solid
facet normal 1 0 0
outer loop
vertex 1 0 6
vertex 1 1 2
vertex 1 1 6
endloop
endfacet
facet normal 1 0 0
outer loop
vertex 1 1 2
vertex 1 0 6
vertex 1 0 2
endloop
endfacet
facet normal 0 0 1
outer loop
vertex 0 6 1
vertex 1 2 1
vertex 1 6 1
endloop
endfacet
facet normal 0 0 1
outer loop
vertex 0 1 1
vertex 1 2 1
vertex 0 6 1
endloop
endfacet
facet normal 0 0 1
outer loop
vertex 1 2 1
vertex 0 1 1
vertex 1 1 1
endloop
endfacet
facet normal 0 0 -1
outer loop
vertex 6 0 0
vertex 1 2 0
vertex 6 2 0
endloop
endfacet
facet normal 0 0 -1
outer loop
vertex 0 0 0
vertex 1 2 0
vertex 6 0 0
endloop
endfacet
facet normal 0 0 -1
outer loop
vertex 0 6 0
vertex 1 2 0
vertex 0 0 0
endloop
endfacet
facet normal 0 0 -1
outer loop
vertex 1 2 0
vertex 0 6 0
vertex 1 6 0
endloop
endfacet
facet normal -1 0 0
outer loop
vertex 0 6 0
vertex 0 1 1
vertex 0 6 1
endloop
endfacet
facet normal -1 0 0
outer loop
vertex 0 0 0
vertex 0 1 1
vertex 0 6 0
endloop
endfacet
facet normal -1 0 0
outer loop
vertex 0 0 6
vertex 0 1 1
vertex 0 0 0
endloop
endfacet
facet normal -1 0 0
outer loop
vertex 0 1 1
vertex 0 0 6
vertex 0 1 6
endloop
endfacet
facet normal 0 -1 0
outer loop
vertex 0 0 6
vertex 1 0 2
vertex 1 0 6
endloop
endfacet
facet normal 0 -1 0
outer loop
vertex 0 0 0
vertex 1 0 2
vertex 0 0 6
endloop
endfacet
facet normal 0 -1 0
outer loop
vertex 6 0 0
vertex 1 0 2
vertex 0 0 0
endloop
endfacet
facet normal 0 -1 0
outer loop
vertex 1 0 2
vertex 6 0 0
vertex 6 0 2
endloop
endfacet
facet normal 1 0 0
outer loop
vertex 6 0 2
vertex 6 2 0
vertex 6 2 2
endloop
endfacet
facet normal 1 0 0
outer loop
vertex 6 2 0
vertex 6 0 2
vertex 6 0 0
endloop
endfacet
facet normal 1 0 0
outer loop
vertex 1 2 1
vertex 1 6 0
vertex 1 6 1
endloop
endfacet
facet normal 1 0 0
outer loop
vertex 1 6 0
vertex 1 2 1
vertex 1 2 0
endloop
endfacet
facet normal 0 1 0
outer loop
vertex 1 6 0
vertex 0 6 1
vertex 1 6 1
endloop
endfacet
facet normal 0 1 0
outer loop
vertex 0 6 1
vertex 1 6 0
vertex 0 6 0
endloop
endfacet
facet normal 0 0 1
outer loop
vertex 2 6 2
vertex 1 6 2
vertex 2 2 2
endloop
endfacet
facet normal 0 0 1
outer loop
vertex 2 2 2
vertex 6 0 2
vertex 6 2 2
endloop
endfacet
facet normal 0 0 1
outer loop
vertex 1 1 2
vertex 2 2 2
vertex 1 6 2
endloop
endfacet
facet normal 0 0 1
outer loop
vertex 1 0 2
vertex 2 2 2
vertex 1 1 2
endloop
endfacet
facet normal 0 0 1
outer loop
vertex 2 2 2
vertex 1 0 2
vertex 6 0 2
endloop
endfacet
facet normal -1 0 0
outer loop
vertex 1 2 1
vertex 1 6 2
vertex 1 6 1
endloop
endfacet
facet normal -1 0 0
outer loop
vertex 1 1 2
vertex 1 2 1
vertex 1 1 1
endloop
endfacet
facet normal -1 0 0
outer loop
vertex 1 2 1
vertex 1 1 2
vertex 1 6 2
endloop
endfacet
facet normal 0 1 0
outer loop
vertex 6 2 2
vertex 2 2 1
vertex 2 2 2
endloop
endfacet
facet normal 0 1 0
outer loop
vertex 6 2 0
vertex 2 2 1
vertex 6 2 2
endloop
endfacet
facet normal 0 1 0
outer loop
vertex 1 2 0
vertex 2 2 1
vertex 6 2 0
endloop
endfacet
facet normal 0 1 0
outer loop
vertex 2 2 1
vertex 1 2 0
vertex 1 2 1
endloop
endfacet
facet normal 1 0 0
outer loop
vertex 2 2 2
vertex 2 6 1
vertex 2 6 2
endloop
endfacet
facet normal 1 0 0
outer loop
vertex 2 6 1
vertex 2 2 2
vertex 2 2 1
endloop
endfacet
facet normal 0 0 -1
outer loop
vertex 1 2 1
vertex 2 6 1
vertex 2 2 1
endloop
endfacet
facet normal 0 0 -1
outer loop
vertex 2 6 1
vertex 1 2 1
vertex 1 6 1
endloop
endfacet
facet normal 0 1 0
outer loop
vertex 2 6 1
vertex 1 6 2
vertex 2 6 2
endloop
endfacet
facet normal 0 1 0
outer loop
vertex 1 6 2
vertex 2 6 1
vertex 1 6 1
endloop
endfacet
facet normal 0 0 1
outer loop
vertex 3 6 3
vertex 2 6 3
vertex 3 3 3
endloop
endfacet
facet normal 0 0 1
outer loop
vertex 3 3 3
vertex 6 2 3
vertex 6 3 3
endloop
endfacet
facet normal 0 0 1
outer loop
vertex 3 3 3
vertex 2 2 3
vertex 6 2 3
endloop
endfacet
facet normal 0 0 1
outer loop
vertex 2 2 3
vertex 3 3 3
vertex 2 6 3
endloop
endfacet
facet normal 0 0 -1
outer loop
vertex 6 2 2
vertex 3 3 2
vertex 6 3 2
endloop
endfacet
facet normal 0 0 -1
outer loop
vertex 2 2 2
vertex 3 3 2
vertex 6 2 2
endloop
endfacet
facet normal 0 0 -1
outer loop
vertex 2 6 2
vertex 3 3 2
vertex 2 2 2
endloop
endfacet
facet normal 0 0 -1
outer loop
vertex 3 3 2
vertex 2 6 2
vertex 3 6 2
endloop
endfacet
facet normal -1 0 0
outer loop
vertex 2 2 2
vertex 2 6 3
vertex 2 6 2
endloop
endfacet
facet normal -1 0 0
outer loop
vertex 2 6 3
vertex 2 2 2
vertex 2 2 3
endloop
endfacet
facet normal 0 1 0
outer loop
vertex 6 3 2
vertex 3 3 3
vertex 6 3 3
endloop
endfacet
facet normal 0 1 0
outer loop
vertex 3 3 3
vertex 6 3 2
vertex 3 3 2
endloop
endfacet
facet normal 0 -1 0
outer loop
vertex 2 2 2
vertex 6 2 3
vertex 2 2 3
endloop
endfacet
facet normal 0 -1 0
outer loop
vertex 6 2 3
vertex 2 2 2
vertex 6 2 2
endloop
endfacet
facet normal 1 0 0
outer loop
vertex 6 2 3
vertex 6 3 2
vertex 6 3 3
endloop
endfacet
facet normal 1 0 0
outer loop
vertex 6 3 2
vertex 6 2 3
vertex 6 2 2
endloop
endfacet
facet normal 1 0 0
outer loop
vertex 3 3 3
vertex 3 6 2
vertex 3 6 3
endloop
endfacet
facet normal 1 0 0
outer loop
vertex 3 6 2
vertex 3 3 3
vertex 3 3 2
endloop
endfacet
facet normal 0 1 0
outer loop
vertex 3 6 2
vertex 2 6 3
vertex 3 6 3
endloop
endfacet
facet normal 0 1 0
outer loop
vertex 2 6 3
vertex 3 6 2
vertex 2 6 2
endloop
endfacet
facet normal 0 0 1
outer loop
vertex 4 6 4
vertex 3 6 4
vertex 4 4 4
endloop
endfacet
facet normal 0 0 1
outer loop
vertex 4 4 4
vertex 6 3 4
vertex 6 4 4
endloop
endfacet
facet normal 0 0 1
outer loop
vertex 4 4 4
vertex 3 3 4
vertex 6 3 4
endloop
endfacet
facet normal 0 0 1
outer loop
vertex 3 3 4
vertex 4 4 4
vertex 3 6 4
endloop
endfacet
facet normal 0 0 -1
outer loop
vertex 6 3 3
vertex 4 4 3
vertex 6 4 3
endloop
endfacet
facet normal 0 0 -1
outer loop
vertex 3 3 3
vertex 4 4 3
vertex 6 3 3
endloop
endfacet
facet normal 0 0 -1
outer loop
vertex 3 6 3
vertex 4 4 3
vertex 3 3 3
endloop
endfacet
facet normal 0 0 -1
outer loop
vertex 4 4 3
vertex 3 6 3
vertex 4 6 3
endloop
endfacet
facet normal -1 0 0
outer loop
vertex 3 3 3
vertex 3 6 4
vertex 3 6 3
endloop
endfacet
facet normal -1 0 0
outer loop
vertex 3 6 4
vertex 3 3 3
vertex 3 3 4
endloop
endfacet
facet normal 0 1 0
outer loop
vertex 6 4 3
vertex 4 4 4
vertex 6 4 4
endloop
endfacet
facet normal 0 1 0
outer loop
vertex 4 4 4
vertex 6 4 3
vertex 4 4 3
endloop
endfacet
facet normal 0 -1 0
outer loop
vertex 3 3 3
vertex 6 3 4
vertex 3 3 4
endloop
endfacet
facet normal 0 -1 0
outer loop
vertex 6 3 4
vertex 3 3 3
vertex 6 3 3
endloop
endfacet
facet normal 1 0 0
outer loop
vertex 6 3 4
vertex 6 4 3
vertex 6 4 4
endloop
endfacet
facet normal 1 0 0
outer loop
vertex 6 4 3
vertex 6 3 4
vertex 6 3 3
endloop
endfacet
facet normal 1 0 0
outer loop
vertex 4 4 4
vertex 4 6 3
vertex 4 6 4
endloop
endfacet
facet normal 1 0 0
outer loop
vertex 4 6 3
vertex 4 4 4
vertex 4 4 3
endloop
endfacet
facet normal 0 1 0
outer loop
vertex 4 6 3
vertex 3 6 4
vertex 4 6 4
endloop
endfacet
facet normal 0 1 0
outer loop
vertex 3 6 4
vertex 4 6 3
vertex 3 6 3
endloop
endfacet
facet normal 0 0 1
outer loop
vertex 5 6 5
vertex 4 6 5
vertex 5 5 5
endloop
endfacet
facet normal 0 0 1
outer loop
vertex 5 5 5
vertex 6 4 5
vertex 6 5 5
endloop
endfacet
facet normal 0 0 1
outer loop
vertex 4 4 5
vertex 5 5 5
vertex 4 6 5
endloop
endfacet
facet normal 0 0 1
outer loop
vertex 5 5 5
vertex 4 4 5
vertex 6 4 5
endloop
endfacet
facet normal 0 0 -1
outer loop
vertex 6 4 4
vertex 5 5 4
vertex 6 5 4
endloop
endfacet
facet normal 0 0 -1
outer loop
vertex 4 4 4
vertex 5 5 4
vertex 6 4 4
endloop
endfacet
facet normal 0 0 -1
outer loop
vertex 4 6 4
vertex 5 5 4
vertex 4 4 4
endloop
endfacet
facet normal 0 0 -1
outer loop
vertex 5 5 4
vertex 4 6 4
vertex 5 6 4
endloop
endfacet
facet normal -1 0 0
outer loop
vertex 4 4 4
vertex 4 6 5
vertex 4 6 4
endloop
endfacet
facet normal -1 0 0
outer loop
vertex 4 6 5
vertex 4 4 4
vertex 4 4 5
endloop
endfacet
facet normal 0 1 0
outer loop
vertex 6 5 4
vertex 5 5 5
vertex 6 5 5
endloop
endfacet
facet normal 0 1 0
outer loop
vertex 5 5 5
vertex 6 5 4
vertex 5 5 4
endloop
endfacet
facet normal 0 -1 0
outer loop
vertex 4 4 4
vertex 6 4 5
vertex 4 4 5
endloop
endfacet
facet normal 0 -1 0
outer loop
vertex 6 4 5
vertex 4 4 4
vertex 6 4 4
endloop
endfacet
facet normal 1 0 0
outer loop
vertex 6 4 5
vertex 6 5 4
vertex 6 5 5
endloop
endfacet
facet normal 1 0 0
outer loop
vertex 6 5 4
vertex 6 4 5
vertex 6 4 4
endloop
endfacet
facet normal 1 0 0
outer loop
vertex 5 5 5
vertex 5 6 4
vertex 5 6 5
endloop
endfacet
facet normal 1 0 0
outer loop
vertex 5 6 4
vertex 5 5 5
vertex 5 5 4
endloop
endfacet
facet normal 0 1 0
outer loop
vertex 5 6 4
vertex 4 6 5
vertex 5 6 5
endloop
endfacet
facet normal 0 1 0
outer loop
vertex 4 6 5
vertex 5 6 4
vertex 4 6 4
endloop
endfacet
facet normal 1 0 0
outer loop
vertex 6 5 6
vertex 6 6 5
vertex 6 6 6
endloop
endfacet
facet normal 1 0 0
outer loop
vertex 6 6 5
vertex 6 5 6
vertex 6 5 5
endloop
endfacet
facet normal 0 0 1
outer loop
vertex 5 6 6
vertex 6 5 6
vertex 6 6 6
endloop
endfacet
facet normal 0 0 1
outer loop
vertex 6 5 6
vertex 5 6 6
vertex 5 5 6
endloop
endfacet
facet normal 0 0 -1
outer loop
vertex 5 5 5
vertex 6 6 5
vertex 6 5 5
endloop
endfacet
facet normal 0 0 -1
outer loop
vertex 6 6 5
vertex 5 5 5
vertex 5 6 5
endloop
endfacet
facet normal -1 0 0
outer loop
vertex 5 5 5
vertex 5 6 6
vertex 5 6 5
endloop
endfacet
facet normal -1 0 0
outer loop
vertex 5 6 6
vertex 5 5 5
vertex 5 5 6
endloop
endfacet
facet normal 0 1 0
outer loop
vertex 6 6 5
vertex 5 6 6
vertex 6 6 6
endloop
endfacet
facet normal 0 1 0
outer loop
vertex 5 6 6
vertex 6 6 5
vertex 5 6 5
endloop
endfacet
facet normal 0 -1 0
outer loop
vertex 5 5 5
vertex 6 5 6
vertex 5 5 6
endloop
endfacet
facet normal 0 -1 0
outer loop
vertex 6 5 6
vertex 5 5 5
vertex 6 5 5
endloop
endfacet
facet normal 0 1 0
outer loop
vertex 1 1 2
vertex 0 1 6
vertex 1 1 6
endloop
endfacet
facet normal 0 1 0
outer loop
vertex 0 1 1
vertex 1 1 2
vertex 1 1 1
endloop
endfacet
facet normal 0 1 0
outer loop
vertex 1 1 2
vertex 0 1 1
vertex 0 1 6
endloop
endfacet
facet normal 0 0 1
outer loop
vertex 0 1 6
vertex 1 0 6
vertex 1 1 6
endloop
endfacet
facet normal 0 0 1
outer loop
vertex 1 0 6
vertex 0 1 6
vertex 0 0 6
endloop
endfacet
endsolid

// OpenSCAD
union() {
    translate([0, 0, 0]) cube([1, 1, 1]);
    translate([1, 0, 0]) cube([1, 1, 1]);
    translate([2, 0, 0]) cube([1, 1, 1]);
    translate([3, 0, 0]) cube([1, 1, 1]);
    translate([4, 0, 0]) cube([1, 1, 1]);
    translate([5, 0, 0]) cube([1, 1, 1]);
    translate([0, 1, 0]) cube([1, 1, 1]);
    translate([0, 2, 0]) cube([1, 1, 1]);
    translate([0, 3, 0]) cube([1, 1, 1]);
    translate([0, 4, 0]) cube([1, 1, 1]);
    translate([0, 5, 0]) cube([1, 1, 1]);
    translate([1, 1, 1]) cube([1, 1, 1]);
    translate([2, 1, 1]) cube([1, 1, 1]);
    translate([3, 1, 1]) cube([1, 1, 1]);
    translate([4, 1, 1]) cube([1, 1, 1]);
    translate([5, 1, 1]) cube([1, 1, 1]);
    translate([1, 2, 1]) cube([1, 1, 1]);
    translate([1, 3, 1]) cube([1, 1, 1]);
    translate([1, 4, 1]) cube([1, 1, 1]);
    translate([1, 5, 1]) cube([1, 1, 1]);
    translate([2, 2, 2]) cube([1, 1, 1]);
    translate([3, 2, 2]) cube([1, 1, 1]);
    translate([4, 2, 2]) cube([1, 1, 1]);
    translate([5, 2, 2]) cube([1, 1, 1]);
    translate([2, 3, 2]) cube([1, 1, 1]);
    translate([2, 4, 2]) cube([1, 1, 1]);
    translate([2, 5, 2]) cube([1, 1, 1]);
    translate([3, 3, 3]) cube([1, 1, 1]);
    translate([4, 3, 3]) cube([1, 1, 1]);
    translate([5, 3, 3]) cube([1, 1, 1]);
    translate([3, 4, 3]) cube([1, 1, 1]);
    translate([3, 5, 3]) cube([1, 1, 1]);
    translate([4, 4, 4]) cube([1, 1, 1]);
    translate([5, 4, 4]) cube([1, 1, 1]);
    translate([4, 5, 4]) cube([1, 1, 1]);
    translate([5, 5, 5]) cube([1, 1, 1]);
    translate([0, 0, 1]) cube([1, 1, 1]);
    translate([0, 0, 2]) cube([1, 1, 1]);
    translate([0, 0, 3]) cube([1, 1, 1]);
    translate([0, 0, 4]) cube([1, 1, 1]);
    translate([0, 0, 5]) cube([1, 1, 1]);
    translate([1, 0, 1]) cube([1, 1, 1]);
    translate([2, 0, 1]) cube([1, 1, 1]);
    translate([3, 0, 1]) cube([1, 1, 1]);
    translate([4, 0, 1]) cube([1, 1, 1]);
    translate([5, 0, 1]) cube([1, 1, 1]);
    translate([1, 1, 0]) cube([1, 1, 1]);
    translate([2, 1, 0]) cube([1, 1, 1]);
    translate([3, 1, 0]) cube([1, 1, 1]);
    translate([4, 1, 0]) cube([1, 1, 1]);
    translate([5, 1, 0]) cube([1, 1, 1]);
}
